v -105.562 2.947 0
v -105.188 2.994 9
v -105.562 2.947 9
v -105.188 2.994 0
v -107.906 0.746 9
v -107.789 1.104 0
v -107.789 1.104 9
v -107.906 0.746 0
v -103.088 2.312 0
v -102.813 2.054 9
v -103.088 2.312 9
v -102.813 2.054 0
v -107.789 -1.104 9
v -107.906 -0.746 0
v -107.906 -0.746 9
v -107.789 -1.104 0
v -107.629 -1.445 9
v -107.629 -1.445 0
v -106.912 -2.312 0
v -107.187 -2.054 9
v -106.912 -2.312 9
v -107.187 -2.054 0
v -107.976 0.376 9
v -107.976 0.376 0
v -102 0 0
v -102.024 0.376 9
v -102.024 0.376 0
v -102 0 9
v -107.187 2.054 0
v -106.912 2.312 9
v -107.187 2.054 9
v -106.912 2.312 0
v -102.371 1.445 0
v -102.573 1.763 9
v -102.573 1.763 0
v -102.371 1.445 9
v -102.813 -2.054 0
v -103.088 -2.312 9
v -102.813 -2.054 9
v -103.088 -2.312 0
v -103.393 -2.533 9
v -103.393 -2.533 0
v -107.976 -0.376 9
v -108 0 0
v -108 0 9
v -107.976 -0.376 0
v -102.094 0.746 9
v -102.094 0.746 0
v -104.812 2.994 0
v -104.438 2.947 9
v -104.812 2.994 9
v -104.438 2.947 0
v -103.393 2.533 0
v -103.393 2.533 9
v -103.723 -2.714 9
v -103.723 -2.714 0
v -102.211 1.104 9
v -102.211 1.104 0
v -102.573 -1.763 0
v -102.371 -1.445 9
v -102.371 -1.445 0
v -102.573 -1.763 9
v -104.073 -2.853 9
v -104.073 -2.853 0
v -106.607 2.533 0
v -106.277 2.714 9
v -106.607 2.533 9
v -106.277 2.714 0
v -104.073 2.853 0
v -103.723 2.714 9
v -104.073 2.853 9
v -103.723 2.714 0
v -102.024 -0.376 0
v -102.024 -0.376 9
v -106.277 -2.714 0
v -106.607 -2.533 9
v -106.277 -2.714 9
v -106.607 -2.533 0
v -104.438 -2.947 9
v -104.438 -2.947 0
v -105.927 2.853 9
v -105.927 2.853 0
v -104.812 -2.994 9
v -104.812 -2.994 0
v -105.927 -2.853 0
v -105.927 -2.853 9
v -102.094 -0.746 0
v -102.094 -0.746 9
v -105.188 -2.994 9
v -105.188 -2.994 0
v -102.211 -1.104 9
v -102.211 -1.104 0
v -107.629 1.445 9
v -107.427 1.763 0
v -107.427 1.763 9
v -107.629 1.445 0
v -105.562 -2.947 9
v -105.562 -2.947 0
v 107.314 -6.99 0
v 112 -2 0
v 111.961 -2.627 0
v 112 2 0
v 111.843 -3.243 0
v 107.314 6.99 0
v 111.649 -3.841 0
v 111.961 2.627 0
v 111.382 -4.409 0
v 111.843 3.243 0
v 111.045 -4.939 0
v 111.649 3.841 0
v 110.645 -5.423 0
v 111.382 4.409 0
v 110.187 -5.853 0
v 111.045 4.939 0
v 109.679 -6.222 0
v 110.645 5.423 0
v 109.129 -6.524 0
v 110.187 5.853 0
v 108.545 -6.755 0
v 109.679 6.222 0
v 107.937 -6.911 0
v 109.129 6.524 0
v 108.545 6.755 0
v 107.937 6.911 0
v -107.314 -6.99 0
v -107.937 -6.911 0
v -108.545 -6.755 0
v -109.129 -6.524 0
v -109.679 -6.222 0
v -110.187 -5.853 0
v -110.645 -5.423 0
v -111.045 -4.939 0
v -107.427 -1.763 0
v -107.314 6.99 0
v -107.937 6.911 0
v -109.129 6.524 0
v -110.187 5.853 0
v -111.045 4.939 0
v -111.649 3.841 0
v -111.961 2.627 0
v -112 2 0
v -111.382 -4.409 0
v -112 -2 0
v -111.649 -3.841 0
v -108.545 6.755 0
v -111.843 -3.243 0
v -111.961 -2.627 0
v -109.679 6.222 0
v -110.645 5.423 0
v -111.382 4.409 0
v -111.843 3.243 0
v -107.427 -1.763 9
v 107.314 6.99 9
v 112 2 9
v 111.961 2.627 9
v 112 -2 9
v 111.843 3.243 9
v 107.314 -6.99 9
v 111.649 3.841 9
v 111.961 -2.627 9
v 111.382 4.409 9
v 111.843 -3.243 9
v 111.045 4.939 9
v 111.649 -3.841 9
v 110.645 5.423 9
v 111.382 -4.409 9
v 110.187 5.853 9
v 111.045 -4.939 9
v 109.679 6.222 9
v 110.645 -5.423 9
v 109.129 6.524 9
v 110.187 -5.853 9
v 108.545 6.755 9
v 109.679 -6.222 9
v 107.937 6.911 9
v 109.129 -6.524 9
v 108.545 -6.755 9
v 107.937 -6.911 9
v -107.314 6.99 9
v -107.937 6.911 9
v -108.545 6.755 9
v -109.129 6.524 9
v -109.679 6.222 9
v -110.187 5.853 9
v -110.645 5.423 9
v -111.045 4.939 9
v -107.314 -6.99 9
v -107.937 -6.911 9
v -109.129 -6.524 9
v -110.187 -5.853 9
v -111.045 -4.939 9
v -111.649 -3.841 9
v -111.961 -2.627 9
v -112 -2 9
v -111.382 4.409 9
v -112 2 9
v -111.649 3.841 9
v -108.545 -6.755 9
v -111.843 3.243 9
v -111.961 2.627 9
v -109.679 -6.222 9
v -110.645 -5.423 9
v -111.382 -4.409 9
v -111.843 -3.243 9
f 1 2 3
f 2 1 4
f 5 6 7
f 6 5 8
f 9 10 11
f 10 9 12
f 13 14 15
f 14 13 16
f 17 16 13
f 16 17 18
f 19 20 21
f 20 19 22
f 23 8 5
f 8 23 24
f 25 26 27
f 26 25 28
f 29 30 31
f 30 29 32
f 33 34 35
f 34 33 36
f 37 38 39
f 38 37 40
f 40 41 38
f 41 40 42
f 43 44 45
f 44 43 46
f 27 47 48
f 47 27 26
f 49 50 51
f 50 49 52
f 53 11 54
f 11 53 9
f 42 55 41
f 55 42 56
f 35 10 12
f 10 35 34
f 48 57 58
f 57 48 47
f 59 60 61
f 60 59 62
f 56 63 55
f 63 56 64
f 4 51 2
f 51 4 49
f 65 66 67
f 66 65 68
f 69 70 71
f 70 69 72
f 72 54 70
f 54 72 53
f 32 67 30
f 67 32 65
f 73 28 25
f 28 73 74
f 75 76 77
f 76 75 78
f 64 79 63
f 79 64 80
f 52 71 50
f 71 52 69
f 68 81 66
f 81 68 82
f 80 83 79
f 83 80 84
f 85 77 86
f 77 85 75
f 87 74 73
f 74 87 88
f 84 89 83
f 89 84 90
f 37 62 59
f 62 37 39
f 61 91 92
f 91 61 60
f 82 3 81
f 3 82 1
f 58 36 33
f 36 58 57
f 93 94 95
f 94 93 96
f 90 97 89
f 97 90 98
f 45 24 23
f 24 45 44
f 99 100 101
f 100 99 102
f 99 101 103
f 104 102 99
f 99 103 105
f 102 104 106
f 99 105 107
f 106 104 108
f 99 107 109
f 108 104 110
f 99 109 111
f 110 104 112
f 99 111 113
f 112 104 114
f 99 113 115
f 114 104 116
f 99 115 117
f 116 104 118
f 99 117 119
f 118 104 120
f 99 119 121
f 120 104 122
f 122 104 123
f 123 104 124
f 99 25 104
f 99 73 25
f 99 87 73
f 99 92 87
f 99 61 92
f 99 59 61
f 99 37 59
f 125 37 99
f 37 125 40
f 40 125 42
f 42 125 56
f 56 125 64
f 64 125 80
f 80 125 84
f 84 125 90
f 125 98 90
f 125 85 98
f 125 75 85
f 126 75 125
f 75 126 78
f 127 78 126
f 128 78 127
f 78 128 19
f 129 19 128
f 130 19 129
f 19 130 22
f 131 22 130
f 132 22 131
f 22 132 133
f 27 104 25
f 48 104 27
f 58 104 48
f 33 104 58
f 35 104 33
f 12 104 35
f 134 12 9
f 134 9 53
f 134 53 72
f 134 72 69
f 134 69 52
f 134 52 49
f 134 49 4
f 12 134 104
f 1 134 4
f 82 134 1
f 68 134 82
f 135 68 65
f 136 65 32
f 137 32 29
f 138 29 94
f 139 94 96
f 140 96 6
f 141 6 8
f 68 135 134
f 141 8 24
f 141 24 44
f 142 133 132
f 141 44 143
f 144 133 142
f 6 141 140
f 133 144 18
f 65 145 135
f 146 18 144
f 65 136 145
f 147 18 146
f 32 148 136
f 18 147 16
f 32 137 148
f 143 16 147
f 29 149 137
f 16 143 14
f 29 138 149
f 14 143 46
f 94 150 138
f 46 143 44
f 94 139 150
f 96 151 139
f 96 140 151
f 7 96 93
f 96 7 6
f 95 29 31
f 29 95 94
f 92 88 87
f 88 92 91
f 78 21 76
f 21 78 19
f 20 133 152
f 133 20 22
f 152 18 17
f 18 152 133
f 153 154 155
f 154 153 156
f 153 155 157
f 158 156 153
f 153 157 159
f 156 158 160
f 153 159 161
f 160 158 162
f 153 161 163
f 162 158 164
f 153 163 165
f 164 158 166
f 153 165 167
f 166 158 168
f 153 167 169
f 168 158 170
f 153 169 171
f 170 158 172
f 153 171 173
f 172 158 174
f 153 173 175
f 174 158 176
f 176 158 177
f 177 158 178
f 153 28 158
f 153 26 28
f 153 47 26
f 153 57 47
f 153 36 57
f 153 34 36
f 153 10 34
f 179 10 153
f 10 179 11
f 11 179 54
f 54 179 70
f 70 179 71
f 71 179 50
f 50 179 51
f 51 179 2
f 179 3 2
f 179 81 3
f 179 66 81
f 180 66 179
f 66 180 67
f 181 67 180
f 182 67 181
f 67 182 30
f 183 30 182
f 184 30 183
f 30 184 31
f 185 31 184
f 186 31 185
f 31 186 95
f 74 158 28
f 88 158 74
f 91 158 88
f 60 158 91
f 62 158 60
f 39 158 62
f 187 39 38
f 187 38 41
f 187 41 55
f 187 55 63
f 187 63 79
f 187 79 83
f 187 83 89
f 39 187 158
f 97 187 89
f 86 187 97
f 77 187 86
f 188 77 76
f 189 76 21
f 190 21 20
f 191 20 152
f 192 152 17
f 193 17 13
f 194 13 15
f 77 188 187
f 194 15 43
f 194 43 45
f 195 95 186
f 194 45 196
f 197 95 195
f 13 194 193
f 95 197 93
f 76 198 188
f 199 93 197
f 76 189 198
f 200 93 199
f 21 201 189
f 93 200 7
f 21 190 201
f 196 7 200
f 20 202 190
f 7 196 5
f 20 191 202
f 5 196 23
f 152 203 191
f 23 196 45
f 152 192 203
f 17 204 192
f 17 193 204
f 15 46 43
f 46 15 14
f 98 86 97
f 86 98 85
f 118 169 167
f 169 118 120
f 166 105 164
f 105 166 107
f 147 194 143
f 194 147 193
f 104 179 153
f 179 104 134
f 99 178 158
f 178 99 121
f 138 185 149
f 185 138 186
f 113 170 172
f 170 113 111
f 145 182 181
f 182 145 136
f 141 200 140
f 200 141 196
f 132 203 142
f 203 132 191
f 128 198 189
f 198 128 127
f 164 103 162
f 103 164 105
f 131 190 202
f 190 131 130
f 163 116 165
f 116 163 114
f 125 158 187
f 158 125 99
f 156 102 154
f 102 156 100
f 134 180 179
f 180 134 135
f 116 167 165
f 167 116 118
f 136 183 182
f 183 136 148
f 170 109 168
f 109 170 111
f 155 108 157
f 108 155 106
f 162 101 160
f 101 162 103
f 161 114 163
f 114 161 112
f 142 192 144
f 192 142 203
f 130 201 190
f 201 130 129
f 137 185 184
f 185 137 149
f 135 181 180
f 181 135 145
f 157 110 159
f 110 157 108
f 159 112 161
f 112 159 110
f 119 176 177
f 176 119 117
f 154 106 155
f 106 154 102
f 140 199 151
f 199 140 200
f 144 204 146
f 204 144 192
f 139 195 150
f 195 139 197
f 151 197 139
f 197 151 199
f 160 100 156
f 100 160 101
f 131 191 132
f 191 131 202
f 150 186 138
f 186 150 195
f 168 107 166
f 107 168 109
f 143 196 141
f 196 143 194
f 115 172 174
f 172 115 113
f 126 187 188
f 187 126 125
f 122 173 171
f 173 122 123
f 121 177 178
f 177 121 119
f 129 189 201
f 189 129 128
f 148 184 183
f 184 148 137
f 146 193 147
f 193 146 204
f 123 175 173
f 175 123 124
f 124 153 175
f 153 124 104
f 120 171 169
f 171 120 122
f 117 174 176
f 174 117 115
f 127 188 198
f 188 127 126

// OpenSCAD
$fn = 50;


difference() {
	union() {
		hull() {
			translate(v = [-107.0000000000, 2.0000000000, 0]) {
				cylinder(h = 9, r = 5);
			}
			translate(v = [107.0000000000, 2.0000000000, 0]) {
				cylinder(h = 9, r = 5);
			}
			translate(v = [-107.0000000000, -2.0000000000, 0]) {
				cylinder(h = 9, r = 5);
			}
			translate(v = [107.0000000000, -2.0000000000, 0]) {
				cylinder(h = 9, r = 5);
			}
		}
	}
	union() {
		translate(v = [-105.0000000000, 0.0000000000, 0]) {
			cylinder(h = 9, r = 3.0000000000);
		}
		translate(v = [-105.0000000000, 0.0000000000, 0]) {
			cylinder(h = 9, r = 1.5000000000);
		}
		translate(v = [-105.0000000000, 0.0000000000, 0]) {
			cylinder(h = 9, r = 1.5000000000);
		}
		translate(v = [-105.0000000000, 0.0000000000, 0]) {
			cylinder(h = 9, r = 1.5000000000);
		}
	}
}
